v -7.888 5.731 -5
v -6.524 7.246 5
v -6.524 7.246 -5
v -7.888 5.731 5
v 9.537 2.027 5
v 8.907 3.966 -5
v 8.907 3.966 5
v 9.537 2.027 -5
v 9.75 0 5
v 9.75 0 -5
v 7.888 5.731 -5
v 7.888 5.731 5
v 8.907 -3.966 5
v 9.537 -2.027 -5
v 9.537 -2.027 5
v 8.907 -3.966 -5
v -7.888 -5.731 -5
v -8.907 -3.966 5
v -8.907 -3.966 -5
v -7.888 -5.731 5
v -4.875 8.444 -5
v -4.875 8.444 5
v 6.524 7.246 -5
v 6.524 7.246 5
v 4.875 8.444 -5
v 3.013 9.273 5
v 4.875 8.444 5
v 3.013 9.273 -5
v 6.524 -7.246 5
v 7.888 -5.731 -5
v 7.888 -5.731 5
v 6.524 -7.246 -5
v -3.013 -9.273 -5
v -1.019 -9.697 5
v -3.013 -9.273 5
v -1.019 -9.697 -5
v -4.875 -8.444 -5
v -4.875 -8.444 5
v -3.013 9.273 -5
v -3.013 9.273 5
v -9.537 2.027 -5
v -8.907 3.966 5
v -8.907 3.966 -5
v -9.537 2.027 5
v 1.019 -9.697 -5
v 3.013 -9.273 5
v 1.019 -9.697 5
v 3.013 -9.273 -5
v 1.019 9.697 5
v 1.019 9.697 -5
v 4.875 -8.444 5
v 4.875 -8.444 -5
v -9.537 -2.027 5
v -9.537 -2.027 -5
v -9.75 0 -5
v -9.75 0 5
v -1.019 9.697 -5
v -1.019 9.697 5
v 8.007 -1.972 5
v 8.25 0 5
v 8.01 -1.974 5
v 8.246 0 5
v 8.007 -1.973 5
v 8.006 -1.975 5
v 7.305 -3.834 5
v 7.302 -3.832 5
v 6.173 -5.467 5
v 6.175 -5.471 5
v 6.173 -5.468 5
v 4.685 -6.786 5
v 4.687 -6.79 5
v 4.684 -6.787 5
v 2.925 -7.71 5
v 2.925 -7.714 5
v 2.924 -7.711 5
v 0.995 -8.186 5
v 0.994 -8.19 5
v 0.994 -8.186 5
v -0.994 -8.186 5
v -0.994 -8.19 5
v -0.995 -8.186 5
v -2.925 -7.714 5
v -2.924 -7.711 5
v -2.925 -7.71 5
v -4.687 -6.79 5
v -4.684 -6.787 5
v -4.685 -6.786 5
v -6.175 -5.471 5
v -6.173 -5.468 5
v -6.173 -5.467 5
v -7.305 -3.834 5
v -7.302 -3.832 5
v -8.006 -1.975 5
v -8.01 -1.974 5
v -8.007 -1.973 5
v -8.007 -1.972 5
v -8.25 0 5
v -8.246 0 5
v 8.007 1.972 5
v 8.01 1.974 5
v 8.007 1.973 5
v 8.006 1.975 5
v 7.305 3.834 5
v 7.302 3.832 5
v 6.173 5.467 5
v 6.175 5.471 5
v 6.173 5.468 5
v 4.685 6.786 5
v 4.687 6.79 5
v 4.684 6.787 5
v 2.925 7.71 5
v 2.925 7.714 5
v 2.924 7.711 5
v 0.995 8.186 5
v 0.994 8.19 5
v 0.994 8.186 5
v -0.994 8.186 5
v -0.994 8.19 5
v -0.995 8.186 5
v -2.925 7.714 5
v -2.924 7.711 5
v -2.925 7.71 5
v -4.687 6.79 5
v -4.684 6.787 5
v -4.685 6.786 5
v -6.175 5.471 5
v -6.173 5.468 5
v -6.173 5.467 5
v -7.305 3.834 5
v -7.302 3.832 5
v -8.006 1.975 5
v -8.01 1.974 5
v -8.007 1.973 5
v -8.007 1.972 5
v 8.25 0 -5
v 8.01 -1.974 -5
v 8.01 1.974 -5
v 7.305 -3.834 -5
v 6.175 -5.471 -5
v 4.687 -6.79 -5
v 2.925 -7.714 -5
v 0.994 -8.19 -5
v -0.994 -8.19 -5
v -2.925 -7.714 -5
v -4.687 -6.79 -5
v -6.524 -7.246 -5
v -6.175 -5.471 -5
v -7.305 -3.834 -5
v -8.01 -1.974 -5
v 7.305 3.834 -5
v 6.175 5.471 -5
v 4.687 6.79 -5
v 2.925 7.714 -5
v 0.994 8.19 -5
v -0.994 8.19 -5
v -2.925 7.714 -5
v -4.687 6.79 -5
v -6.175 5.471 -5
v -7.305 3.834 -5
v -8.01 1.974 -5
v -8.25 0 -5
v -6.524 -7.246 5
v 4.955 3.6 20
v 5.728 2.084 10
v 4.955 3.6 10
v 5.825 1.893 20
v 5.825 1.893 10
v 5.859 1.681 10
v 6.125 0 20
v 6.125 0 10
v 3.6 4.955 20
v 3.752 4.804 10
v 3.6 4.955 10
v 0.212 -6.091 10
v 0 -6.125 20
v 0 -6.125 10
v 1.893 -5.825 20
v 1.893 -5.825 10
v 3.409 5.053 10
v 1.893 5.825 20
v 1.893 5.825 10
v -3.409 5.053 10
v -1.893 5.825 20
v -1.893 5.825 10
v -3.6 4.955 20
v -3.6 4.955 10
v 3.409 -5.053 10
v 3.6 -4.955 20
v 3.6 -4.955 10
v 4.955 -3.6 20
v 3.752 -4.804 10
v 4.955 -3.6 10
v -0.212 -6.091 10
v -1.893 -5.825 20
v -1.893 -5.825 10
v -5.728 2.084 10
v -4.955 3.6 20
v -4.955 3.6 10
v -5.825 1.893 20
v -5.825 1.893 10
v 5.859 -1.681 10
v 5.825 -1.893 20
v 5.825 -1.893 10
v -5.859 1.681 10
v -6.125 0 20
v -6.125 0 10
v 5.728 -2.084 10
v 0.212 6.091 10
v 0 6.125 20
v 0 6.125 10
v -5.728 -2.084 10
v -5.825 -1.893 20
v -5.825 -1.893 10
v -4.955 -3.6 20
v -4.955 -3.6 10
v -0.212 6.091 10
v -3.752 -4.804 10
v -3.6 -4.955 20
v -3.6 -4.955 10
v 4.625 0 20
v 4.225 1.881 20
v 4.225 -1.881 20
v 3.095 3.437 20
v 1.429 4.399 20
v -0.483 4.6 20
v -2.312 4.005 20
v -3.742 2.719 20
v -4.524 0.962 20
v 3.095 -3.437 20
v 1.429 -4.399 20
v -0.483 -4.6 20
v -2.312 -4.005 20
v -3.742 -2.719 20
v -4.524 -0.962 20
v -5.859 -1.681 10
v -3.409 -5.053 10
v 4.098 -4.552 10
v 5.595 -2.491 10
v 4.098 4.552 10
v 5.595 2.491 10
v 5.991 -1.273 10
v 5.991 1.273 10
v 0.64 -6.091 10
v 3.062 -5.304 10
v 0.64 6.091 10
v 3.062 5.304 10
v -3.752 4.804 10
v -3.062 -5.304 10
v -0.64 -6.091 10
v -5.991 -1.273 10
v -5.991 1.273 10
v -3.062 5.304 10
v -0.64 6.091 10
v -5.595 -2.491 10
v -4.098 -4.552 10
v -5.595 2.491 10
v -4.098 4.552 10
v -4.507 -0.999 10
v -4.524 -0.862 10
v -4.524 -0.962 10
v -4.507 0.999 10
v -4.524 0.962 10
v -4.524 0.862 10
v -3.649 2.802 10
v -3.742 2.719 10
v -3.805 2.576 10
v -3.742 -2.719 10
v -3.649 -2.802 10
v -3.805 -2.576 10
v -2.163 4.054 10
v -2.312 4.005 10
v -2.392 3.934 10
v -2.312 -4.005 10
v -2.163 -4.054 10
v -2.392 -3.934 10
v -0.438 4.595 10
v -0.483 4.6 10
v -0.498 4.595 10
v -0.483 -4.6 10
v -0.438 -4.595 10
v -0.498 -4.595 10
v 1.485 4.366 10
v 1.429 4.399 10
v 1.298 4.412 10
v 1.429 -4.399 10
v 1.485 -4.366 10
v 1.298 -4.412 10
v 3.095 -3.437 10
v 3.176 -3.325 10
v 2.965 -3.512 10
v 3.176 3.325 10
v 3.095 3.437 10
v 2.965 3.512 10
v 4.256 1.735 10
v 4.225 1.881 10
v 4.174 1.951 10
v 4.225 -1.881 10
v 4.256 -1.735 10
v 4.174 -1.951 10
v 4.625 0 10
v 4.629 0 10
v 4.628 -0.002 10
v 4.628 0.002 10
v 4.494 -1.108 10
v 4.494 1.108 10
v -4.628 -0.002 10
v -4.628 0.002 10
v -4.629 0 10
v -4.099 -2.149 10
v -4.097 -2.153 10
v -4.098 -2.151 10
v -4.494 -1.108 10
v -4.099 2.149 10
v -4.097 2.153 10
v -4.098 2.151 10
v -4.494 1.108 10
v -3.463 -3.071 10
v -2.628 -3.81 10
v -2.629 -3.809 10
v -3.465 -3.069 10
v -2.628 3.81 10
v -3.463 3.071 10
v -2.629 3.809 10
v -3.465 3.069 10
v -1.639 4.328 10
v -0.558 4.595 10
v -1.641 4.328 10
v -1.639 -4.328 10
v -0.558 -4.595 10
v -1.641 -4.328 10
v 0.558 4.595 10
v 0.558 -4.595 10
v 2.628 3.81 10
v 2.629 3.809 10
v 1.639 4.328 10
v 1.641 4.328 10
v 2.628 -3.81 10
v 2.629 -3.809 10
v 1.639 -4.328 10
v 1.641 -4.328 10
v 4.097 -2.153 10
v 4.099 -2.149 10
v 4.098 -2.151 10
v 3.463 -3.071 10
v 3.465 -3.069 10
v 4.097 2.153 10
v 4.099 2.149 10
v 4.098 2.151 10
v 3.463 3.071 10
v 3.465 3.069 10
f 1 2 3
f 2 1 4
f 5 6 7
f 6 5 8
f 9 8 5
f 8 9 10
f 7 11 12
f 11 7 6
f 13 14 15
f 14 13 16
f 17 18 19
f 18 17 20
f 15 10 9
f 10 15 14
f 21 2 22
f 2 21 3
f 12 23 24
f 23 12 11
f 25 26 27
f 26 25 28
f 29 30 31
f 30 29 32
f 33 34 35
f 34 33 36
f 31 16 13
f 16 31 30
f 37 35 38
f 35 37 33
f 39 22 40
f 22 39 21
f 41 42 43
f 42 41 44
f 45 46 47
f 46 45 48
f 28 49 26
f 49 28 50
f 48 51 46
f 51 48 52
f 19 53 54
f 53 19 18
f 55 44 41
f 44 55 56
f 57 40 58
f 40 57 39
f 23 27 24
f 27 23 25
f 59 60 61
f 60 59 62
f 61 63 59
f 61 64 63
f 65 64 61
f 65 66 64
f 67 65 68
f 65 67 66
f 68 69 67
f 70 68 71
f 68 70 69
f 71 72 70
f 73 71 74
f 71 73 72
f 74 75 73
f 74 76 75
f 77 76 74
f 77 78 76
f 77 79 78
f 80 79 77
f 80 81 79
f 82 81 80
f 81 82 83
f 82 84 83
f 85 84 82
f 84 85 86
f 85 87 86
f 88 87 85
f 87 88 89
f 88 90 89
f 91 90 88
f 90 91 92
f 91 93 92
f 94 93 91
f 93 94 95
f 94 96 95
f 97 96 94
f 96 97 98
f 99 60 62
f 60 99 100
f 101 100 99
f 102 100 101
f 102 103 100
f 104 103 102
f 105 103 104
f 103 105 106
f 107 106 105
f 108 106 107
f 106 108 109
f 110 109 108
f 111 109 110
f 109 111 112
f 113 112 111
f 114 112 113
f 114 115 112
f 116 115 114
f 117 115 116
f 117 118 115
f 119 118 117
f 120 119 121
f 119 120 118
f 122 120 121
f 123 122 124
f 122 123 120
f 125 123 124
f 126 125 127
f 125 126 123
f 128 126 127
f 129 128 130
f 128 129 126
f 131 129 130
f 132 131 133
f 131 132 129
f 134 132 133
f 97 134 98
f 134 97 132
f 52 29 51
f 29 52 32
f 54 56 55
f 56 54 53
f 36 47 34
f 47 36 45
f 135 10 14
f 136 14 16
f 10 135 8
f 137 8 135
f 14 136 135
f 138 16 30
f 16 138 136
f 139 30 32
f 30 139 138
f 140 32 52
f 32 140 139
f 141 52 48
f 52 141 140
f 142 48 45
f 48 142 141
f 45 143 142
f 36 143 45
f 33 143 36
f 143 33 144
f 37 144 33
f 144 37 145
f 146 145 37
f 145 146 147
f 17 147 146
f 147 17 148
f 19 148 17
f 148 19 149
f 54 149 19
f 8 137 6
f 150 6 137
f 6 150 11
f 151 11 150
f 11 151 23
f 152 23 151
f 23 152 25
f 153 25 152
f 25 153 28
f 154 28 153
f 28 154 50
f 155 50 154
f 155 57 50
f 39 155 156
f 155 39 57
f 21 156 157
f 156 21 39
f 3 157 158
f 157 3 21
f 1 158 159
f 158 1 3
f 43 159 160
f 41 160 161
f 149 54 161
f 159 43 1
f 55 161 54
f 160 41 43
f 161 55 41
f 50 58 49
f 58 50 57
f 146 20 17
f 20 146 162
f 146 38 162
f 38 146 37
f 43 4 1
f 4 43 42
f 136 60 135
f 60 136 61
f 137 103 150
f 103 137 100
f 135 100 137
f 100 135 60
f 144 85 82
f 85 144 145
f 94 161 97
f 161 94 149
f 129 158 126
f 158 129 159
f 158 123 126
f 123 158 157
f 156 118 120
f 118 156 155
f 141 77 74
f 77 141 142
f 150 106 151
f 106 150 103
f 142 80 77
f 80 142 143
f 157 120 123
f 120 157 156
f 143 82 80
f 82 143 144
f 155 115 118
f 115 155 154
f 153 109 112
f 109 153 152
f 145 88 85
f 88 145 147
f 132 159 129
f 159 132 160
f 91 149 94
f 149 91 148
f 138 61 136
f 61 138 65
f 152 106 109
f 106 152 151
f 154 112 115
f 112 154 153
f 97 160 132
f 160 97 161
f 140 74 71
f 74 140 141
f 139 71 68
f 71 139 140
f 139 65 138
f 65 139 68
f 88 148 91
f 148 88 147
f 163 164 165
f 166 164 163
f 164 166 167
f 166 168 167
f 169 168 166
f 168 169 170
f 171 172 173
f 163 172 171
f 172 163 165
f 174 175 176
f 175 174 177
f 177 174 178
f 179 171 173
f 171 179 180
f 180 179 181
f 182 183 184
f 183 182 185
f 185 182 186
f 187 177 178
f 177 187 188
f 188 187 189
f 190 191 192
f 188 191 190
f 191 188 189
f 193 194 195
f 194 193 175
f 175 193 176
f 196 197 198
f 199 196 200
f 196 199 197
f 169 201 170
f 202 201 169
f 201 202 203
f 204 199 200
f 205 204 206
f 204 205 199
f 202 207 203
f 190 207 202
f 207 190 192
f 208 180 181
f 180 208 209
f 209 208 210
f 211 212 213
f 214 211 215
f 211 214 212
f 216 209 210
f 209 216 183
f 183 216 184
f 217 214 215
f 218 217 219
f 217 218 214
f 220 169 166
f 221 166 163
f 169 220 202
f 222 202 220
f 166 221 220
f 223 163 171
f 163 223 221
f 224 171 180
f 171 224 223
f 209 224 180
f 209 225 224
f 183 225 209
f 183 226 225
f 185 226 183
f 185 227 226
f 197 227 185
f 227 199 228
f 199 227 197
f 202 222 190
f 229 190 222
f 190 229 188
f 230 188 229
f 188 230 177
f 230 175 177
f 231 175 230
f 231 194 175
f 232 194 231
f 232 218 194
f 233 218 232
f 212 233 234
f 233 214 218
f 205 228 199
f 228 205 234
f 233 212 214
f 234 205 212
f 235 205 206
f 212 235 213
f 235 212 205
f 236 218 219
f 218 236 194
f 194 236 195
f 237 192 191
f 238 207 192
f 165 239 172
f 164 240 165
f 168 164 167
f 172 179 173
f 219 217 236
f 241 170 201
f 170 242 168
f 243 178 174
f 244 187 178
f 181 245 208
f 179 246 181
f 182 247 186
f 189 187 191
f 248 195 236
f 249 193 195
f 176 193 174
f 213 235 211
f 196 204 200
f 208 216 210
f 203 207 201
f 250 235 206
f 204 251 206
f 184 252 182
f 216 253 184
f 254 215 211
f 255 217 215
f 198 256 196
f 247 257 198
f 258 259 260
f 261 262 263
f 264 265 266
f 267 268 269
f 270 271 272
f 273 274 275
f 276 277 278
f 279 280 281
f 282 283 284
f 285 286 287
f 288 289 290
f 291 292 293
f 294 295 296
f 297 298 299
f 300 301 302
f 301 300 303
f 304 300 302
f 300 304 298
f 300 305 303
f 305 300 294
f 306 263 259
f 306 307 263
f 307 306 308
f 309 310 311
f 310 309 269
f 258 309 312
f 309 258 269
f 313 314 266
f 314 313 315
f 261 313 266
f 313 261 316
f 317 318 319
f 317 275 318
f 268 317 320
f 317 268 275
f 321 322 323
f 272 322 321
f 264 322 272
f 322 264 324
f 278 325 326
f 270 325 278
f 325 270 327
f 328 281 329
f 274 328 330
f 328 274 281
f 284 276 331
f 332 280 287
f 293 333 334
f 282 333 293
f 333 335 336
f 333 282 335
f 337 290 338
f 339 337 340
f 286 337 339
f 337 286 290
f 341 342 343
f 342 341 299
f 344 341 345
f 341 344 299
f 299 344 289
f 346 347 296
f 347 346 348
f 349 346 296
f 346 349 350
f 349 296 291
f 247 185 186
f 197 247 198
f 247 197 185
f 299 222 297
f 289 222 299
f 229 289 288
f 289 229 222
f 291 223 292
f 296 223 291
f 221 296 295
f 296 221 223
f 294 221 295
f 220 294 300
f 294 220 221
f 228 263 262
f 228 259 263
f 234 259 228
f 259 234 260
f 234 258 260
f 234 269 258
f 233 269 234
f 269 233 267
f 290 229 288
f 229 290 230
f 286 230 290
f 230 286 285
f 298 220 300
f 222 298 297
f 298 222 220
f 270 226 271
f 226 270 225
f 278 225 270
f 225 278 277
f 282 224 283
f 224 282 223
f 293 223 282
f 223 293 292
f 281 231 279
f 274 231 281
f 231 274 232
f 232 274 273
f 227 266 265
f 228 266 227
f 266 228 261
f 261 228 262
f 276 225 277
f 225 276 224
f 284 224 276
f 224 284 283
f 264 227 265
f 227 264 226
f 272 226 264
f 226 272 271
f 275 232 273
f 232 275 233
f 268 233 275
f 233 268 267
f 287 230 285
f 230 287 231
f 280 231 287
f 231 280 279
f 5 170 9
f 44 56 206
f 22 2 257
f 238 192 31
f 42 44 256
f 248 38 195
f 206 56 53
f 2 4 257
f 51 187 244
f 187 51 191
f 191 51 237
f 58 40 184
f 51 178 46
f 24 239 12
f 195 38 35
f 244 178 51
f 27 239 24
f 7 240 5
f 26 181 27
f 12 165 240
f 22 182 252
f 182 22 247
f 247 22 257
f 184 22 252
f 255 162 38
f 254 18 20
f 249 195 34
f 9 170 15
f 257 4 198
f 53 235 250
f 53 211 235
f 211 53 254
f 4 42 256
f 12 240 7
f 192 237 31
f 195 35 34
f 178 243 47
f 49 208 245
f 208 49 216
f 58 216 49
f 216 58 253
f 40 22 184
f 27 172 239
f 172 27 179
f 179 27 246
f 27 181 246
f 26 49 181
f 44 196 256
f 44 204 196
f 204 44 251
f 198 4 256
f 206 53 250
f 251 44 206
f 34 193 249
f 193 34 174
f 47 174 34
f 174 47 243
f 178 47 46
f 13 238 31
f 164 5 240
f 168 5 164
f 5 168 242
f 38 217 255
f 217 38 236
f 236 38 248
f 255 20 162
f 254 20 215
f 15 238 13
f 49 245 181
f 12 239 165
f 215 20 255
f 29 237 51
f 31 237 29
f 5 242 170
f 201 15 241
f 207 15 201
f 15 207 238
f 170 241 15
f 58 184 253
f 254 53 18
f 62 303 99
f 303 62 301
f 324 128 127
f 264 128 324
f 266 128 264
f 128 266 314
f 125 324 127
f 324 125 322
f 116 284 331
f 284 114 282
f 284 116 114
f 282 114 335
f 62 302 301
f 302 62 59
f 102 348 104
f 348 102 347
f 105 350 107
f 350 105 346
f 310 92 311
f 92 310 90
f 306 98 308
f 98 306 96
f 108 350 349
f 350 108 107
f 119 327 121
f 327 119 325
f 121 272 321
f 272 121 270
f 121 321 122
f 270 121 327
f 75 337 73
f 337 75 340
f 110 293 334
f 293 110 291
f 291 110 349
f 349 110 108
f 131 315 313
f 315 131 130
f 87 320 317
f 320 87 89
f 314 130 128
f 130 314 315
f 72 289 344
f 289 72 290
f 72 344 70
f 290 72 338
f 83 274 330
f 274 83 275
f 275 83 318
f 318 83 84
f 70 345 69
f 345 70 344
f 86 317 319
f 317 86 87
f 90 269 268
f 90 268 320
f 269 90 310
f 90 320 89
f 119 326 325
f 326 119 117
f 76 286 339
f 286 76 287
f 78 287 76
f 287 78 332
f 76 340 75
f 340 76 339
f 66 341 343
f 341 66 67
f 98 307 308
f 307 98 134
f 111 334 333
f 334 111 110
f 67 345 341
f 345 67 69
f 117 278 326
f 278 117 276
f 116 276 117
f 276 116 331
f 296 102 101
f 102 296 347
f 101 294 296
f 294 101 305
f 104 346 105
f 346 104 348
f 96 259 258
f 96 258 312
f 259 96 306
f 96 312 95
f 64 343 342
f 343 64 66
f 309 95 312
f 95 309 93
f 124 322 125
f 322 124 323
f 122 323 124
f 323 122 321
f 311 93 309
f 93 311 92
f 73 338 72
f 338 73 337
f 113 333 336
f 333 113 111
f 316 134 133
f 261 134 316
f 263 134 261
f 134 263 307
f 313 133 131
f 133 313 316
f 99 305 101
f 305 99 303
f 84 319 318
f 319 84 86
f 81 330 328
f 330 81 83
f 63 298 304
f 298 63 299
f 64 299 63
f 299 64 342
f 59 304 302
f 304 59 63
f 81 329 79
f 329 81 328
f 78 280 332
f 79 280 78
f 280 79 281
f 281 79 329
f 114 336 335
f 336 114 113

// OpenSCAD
diameterA=9.25;
heightA=10;
diameterB=16.50;
heightB=10;
connectorHeight=5;
wallThickness=3;

module tube(h, d, thickness) {
  difference() {
    cylinder(h=h, d=d + thickness, center=true);
    // Extra height helps z-fighting in the preview.
    cylinder(h=h + 0.01, d=d, center=true);
  }
}

module tubeConnector(h, d1, d2, thickness) {
  difference() {
    cylinder(h=h, d1=d1 + thickness, d2=d2 + thickness, center=true);
    // Extra height helps z-fighting in the preview.
    cylinder(h=h + 0.01, d1=d1, d2=d2, center=true);
  }
}

tube(h=heightB, d=diameterB, thickness=wallThickness);
translate([0, 0, heightB + connectorHeight])
  tube(h=heightA, d=diameterA, thickness=wallThickness);
translate([0, 0, heightB - connectorHeight / 2])
  tubeConnector(
    h=connectorHeight,
    d1=diameterB,
    d2=diameterA,
    thickness=wallThickness
  );
